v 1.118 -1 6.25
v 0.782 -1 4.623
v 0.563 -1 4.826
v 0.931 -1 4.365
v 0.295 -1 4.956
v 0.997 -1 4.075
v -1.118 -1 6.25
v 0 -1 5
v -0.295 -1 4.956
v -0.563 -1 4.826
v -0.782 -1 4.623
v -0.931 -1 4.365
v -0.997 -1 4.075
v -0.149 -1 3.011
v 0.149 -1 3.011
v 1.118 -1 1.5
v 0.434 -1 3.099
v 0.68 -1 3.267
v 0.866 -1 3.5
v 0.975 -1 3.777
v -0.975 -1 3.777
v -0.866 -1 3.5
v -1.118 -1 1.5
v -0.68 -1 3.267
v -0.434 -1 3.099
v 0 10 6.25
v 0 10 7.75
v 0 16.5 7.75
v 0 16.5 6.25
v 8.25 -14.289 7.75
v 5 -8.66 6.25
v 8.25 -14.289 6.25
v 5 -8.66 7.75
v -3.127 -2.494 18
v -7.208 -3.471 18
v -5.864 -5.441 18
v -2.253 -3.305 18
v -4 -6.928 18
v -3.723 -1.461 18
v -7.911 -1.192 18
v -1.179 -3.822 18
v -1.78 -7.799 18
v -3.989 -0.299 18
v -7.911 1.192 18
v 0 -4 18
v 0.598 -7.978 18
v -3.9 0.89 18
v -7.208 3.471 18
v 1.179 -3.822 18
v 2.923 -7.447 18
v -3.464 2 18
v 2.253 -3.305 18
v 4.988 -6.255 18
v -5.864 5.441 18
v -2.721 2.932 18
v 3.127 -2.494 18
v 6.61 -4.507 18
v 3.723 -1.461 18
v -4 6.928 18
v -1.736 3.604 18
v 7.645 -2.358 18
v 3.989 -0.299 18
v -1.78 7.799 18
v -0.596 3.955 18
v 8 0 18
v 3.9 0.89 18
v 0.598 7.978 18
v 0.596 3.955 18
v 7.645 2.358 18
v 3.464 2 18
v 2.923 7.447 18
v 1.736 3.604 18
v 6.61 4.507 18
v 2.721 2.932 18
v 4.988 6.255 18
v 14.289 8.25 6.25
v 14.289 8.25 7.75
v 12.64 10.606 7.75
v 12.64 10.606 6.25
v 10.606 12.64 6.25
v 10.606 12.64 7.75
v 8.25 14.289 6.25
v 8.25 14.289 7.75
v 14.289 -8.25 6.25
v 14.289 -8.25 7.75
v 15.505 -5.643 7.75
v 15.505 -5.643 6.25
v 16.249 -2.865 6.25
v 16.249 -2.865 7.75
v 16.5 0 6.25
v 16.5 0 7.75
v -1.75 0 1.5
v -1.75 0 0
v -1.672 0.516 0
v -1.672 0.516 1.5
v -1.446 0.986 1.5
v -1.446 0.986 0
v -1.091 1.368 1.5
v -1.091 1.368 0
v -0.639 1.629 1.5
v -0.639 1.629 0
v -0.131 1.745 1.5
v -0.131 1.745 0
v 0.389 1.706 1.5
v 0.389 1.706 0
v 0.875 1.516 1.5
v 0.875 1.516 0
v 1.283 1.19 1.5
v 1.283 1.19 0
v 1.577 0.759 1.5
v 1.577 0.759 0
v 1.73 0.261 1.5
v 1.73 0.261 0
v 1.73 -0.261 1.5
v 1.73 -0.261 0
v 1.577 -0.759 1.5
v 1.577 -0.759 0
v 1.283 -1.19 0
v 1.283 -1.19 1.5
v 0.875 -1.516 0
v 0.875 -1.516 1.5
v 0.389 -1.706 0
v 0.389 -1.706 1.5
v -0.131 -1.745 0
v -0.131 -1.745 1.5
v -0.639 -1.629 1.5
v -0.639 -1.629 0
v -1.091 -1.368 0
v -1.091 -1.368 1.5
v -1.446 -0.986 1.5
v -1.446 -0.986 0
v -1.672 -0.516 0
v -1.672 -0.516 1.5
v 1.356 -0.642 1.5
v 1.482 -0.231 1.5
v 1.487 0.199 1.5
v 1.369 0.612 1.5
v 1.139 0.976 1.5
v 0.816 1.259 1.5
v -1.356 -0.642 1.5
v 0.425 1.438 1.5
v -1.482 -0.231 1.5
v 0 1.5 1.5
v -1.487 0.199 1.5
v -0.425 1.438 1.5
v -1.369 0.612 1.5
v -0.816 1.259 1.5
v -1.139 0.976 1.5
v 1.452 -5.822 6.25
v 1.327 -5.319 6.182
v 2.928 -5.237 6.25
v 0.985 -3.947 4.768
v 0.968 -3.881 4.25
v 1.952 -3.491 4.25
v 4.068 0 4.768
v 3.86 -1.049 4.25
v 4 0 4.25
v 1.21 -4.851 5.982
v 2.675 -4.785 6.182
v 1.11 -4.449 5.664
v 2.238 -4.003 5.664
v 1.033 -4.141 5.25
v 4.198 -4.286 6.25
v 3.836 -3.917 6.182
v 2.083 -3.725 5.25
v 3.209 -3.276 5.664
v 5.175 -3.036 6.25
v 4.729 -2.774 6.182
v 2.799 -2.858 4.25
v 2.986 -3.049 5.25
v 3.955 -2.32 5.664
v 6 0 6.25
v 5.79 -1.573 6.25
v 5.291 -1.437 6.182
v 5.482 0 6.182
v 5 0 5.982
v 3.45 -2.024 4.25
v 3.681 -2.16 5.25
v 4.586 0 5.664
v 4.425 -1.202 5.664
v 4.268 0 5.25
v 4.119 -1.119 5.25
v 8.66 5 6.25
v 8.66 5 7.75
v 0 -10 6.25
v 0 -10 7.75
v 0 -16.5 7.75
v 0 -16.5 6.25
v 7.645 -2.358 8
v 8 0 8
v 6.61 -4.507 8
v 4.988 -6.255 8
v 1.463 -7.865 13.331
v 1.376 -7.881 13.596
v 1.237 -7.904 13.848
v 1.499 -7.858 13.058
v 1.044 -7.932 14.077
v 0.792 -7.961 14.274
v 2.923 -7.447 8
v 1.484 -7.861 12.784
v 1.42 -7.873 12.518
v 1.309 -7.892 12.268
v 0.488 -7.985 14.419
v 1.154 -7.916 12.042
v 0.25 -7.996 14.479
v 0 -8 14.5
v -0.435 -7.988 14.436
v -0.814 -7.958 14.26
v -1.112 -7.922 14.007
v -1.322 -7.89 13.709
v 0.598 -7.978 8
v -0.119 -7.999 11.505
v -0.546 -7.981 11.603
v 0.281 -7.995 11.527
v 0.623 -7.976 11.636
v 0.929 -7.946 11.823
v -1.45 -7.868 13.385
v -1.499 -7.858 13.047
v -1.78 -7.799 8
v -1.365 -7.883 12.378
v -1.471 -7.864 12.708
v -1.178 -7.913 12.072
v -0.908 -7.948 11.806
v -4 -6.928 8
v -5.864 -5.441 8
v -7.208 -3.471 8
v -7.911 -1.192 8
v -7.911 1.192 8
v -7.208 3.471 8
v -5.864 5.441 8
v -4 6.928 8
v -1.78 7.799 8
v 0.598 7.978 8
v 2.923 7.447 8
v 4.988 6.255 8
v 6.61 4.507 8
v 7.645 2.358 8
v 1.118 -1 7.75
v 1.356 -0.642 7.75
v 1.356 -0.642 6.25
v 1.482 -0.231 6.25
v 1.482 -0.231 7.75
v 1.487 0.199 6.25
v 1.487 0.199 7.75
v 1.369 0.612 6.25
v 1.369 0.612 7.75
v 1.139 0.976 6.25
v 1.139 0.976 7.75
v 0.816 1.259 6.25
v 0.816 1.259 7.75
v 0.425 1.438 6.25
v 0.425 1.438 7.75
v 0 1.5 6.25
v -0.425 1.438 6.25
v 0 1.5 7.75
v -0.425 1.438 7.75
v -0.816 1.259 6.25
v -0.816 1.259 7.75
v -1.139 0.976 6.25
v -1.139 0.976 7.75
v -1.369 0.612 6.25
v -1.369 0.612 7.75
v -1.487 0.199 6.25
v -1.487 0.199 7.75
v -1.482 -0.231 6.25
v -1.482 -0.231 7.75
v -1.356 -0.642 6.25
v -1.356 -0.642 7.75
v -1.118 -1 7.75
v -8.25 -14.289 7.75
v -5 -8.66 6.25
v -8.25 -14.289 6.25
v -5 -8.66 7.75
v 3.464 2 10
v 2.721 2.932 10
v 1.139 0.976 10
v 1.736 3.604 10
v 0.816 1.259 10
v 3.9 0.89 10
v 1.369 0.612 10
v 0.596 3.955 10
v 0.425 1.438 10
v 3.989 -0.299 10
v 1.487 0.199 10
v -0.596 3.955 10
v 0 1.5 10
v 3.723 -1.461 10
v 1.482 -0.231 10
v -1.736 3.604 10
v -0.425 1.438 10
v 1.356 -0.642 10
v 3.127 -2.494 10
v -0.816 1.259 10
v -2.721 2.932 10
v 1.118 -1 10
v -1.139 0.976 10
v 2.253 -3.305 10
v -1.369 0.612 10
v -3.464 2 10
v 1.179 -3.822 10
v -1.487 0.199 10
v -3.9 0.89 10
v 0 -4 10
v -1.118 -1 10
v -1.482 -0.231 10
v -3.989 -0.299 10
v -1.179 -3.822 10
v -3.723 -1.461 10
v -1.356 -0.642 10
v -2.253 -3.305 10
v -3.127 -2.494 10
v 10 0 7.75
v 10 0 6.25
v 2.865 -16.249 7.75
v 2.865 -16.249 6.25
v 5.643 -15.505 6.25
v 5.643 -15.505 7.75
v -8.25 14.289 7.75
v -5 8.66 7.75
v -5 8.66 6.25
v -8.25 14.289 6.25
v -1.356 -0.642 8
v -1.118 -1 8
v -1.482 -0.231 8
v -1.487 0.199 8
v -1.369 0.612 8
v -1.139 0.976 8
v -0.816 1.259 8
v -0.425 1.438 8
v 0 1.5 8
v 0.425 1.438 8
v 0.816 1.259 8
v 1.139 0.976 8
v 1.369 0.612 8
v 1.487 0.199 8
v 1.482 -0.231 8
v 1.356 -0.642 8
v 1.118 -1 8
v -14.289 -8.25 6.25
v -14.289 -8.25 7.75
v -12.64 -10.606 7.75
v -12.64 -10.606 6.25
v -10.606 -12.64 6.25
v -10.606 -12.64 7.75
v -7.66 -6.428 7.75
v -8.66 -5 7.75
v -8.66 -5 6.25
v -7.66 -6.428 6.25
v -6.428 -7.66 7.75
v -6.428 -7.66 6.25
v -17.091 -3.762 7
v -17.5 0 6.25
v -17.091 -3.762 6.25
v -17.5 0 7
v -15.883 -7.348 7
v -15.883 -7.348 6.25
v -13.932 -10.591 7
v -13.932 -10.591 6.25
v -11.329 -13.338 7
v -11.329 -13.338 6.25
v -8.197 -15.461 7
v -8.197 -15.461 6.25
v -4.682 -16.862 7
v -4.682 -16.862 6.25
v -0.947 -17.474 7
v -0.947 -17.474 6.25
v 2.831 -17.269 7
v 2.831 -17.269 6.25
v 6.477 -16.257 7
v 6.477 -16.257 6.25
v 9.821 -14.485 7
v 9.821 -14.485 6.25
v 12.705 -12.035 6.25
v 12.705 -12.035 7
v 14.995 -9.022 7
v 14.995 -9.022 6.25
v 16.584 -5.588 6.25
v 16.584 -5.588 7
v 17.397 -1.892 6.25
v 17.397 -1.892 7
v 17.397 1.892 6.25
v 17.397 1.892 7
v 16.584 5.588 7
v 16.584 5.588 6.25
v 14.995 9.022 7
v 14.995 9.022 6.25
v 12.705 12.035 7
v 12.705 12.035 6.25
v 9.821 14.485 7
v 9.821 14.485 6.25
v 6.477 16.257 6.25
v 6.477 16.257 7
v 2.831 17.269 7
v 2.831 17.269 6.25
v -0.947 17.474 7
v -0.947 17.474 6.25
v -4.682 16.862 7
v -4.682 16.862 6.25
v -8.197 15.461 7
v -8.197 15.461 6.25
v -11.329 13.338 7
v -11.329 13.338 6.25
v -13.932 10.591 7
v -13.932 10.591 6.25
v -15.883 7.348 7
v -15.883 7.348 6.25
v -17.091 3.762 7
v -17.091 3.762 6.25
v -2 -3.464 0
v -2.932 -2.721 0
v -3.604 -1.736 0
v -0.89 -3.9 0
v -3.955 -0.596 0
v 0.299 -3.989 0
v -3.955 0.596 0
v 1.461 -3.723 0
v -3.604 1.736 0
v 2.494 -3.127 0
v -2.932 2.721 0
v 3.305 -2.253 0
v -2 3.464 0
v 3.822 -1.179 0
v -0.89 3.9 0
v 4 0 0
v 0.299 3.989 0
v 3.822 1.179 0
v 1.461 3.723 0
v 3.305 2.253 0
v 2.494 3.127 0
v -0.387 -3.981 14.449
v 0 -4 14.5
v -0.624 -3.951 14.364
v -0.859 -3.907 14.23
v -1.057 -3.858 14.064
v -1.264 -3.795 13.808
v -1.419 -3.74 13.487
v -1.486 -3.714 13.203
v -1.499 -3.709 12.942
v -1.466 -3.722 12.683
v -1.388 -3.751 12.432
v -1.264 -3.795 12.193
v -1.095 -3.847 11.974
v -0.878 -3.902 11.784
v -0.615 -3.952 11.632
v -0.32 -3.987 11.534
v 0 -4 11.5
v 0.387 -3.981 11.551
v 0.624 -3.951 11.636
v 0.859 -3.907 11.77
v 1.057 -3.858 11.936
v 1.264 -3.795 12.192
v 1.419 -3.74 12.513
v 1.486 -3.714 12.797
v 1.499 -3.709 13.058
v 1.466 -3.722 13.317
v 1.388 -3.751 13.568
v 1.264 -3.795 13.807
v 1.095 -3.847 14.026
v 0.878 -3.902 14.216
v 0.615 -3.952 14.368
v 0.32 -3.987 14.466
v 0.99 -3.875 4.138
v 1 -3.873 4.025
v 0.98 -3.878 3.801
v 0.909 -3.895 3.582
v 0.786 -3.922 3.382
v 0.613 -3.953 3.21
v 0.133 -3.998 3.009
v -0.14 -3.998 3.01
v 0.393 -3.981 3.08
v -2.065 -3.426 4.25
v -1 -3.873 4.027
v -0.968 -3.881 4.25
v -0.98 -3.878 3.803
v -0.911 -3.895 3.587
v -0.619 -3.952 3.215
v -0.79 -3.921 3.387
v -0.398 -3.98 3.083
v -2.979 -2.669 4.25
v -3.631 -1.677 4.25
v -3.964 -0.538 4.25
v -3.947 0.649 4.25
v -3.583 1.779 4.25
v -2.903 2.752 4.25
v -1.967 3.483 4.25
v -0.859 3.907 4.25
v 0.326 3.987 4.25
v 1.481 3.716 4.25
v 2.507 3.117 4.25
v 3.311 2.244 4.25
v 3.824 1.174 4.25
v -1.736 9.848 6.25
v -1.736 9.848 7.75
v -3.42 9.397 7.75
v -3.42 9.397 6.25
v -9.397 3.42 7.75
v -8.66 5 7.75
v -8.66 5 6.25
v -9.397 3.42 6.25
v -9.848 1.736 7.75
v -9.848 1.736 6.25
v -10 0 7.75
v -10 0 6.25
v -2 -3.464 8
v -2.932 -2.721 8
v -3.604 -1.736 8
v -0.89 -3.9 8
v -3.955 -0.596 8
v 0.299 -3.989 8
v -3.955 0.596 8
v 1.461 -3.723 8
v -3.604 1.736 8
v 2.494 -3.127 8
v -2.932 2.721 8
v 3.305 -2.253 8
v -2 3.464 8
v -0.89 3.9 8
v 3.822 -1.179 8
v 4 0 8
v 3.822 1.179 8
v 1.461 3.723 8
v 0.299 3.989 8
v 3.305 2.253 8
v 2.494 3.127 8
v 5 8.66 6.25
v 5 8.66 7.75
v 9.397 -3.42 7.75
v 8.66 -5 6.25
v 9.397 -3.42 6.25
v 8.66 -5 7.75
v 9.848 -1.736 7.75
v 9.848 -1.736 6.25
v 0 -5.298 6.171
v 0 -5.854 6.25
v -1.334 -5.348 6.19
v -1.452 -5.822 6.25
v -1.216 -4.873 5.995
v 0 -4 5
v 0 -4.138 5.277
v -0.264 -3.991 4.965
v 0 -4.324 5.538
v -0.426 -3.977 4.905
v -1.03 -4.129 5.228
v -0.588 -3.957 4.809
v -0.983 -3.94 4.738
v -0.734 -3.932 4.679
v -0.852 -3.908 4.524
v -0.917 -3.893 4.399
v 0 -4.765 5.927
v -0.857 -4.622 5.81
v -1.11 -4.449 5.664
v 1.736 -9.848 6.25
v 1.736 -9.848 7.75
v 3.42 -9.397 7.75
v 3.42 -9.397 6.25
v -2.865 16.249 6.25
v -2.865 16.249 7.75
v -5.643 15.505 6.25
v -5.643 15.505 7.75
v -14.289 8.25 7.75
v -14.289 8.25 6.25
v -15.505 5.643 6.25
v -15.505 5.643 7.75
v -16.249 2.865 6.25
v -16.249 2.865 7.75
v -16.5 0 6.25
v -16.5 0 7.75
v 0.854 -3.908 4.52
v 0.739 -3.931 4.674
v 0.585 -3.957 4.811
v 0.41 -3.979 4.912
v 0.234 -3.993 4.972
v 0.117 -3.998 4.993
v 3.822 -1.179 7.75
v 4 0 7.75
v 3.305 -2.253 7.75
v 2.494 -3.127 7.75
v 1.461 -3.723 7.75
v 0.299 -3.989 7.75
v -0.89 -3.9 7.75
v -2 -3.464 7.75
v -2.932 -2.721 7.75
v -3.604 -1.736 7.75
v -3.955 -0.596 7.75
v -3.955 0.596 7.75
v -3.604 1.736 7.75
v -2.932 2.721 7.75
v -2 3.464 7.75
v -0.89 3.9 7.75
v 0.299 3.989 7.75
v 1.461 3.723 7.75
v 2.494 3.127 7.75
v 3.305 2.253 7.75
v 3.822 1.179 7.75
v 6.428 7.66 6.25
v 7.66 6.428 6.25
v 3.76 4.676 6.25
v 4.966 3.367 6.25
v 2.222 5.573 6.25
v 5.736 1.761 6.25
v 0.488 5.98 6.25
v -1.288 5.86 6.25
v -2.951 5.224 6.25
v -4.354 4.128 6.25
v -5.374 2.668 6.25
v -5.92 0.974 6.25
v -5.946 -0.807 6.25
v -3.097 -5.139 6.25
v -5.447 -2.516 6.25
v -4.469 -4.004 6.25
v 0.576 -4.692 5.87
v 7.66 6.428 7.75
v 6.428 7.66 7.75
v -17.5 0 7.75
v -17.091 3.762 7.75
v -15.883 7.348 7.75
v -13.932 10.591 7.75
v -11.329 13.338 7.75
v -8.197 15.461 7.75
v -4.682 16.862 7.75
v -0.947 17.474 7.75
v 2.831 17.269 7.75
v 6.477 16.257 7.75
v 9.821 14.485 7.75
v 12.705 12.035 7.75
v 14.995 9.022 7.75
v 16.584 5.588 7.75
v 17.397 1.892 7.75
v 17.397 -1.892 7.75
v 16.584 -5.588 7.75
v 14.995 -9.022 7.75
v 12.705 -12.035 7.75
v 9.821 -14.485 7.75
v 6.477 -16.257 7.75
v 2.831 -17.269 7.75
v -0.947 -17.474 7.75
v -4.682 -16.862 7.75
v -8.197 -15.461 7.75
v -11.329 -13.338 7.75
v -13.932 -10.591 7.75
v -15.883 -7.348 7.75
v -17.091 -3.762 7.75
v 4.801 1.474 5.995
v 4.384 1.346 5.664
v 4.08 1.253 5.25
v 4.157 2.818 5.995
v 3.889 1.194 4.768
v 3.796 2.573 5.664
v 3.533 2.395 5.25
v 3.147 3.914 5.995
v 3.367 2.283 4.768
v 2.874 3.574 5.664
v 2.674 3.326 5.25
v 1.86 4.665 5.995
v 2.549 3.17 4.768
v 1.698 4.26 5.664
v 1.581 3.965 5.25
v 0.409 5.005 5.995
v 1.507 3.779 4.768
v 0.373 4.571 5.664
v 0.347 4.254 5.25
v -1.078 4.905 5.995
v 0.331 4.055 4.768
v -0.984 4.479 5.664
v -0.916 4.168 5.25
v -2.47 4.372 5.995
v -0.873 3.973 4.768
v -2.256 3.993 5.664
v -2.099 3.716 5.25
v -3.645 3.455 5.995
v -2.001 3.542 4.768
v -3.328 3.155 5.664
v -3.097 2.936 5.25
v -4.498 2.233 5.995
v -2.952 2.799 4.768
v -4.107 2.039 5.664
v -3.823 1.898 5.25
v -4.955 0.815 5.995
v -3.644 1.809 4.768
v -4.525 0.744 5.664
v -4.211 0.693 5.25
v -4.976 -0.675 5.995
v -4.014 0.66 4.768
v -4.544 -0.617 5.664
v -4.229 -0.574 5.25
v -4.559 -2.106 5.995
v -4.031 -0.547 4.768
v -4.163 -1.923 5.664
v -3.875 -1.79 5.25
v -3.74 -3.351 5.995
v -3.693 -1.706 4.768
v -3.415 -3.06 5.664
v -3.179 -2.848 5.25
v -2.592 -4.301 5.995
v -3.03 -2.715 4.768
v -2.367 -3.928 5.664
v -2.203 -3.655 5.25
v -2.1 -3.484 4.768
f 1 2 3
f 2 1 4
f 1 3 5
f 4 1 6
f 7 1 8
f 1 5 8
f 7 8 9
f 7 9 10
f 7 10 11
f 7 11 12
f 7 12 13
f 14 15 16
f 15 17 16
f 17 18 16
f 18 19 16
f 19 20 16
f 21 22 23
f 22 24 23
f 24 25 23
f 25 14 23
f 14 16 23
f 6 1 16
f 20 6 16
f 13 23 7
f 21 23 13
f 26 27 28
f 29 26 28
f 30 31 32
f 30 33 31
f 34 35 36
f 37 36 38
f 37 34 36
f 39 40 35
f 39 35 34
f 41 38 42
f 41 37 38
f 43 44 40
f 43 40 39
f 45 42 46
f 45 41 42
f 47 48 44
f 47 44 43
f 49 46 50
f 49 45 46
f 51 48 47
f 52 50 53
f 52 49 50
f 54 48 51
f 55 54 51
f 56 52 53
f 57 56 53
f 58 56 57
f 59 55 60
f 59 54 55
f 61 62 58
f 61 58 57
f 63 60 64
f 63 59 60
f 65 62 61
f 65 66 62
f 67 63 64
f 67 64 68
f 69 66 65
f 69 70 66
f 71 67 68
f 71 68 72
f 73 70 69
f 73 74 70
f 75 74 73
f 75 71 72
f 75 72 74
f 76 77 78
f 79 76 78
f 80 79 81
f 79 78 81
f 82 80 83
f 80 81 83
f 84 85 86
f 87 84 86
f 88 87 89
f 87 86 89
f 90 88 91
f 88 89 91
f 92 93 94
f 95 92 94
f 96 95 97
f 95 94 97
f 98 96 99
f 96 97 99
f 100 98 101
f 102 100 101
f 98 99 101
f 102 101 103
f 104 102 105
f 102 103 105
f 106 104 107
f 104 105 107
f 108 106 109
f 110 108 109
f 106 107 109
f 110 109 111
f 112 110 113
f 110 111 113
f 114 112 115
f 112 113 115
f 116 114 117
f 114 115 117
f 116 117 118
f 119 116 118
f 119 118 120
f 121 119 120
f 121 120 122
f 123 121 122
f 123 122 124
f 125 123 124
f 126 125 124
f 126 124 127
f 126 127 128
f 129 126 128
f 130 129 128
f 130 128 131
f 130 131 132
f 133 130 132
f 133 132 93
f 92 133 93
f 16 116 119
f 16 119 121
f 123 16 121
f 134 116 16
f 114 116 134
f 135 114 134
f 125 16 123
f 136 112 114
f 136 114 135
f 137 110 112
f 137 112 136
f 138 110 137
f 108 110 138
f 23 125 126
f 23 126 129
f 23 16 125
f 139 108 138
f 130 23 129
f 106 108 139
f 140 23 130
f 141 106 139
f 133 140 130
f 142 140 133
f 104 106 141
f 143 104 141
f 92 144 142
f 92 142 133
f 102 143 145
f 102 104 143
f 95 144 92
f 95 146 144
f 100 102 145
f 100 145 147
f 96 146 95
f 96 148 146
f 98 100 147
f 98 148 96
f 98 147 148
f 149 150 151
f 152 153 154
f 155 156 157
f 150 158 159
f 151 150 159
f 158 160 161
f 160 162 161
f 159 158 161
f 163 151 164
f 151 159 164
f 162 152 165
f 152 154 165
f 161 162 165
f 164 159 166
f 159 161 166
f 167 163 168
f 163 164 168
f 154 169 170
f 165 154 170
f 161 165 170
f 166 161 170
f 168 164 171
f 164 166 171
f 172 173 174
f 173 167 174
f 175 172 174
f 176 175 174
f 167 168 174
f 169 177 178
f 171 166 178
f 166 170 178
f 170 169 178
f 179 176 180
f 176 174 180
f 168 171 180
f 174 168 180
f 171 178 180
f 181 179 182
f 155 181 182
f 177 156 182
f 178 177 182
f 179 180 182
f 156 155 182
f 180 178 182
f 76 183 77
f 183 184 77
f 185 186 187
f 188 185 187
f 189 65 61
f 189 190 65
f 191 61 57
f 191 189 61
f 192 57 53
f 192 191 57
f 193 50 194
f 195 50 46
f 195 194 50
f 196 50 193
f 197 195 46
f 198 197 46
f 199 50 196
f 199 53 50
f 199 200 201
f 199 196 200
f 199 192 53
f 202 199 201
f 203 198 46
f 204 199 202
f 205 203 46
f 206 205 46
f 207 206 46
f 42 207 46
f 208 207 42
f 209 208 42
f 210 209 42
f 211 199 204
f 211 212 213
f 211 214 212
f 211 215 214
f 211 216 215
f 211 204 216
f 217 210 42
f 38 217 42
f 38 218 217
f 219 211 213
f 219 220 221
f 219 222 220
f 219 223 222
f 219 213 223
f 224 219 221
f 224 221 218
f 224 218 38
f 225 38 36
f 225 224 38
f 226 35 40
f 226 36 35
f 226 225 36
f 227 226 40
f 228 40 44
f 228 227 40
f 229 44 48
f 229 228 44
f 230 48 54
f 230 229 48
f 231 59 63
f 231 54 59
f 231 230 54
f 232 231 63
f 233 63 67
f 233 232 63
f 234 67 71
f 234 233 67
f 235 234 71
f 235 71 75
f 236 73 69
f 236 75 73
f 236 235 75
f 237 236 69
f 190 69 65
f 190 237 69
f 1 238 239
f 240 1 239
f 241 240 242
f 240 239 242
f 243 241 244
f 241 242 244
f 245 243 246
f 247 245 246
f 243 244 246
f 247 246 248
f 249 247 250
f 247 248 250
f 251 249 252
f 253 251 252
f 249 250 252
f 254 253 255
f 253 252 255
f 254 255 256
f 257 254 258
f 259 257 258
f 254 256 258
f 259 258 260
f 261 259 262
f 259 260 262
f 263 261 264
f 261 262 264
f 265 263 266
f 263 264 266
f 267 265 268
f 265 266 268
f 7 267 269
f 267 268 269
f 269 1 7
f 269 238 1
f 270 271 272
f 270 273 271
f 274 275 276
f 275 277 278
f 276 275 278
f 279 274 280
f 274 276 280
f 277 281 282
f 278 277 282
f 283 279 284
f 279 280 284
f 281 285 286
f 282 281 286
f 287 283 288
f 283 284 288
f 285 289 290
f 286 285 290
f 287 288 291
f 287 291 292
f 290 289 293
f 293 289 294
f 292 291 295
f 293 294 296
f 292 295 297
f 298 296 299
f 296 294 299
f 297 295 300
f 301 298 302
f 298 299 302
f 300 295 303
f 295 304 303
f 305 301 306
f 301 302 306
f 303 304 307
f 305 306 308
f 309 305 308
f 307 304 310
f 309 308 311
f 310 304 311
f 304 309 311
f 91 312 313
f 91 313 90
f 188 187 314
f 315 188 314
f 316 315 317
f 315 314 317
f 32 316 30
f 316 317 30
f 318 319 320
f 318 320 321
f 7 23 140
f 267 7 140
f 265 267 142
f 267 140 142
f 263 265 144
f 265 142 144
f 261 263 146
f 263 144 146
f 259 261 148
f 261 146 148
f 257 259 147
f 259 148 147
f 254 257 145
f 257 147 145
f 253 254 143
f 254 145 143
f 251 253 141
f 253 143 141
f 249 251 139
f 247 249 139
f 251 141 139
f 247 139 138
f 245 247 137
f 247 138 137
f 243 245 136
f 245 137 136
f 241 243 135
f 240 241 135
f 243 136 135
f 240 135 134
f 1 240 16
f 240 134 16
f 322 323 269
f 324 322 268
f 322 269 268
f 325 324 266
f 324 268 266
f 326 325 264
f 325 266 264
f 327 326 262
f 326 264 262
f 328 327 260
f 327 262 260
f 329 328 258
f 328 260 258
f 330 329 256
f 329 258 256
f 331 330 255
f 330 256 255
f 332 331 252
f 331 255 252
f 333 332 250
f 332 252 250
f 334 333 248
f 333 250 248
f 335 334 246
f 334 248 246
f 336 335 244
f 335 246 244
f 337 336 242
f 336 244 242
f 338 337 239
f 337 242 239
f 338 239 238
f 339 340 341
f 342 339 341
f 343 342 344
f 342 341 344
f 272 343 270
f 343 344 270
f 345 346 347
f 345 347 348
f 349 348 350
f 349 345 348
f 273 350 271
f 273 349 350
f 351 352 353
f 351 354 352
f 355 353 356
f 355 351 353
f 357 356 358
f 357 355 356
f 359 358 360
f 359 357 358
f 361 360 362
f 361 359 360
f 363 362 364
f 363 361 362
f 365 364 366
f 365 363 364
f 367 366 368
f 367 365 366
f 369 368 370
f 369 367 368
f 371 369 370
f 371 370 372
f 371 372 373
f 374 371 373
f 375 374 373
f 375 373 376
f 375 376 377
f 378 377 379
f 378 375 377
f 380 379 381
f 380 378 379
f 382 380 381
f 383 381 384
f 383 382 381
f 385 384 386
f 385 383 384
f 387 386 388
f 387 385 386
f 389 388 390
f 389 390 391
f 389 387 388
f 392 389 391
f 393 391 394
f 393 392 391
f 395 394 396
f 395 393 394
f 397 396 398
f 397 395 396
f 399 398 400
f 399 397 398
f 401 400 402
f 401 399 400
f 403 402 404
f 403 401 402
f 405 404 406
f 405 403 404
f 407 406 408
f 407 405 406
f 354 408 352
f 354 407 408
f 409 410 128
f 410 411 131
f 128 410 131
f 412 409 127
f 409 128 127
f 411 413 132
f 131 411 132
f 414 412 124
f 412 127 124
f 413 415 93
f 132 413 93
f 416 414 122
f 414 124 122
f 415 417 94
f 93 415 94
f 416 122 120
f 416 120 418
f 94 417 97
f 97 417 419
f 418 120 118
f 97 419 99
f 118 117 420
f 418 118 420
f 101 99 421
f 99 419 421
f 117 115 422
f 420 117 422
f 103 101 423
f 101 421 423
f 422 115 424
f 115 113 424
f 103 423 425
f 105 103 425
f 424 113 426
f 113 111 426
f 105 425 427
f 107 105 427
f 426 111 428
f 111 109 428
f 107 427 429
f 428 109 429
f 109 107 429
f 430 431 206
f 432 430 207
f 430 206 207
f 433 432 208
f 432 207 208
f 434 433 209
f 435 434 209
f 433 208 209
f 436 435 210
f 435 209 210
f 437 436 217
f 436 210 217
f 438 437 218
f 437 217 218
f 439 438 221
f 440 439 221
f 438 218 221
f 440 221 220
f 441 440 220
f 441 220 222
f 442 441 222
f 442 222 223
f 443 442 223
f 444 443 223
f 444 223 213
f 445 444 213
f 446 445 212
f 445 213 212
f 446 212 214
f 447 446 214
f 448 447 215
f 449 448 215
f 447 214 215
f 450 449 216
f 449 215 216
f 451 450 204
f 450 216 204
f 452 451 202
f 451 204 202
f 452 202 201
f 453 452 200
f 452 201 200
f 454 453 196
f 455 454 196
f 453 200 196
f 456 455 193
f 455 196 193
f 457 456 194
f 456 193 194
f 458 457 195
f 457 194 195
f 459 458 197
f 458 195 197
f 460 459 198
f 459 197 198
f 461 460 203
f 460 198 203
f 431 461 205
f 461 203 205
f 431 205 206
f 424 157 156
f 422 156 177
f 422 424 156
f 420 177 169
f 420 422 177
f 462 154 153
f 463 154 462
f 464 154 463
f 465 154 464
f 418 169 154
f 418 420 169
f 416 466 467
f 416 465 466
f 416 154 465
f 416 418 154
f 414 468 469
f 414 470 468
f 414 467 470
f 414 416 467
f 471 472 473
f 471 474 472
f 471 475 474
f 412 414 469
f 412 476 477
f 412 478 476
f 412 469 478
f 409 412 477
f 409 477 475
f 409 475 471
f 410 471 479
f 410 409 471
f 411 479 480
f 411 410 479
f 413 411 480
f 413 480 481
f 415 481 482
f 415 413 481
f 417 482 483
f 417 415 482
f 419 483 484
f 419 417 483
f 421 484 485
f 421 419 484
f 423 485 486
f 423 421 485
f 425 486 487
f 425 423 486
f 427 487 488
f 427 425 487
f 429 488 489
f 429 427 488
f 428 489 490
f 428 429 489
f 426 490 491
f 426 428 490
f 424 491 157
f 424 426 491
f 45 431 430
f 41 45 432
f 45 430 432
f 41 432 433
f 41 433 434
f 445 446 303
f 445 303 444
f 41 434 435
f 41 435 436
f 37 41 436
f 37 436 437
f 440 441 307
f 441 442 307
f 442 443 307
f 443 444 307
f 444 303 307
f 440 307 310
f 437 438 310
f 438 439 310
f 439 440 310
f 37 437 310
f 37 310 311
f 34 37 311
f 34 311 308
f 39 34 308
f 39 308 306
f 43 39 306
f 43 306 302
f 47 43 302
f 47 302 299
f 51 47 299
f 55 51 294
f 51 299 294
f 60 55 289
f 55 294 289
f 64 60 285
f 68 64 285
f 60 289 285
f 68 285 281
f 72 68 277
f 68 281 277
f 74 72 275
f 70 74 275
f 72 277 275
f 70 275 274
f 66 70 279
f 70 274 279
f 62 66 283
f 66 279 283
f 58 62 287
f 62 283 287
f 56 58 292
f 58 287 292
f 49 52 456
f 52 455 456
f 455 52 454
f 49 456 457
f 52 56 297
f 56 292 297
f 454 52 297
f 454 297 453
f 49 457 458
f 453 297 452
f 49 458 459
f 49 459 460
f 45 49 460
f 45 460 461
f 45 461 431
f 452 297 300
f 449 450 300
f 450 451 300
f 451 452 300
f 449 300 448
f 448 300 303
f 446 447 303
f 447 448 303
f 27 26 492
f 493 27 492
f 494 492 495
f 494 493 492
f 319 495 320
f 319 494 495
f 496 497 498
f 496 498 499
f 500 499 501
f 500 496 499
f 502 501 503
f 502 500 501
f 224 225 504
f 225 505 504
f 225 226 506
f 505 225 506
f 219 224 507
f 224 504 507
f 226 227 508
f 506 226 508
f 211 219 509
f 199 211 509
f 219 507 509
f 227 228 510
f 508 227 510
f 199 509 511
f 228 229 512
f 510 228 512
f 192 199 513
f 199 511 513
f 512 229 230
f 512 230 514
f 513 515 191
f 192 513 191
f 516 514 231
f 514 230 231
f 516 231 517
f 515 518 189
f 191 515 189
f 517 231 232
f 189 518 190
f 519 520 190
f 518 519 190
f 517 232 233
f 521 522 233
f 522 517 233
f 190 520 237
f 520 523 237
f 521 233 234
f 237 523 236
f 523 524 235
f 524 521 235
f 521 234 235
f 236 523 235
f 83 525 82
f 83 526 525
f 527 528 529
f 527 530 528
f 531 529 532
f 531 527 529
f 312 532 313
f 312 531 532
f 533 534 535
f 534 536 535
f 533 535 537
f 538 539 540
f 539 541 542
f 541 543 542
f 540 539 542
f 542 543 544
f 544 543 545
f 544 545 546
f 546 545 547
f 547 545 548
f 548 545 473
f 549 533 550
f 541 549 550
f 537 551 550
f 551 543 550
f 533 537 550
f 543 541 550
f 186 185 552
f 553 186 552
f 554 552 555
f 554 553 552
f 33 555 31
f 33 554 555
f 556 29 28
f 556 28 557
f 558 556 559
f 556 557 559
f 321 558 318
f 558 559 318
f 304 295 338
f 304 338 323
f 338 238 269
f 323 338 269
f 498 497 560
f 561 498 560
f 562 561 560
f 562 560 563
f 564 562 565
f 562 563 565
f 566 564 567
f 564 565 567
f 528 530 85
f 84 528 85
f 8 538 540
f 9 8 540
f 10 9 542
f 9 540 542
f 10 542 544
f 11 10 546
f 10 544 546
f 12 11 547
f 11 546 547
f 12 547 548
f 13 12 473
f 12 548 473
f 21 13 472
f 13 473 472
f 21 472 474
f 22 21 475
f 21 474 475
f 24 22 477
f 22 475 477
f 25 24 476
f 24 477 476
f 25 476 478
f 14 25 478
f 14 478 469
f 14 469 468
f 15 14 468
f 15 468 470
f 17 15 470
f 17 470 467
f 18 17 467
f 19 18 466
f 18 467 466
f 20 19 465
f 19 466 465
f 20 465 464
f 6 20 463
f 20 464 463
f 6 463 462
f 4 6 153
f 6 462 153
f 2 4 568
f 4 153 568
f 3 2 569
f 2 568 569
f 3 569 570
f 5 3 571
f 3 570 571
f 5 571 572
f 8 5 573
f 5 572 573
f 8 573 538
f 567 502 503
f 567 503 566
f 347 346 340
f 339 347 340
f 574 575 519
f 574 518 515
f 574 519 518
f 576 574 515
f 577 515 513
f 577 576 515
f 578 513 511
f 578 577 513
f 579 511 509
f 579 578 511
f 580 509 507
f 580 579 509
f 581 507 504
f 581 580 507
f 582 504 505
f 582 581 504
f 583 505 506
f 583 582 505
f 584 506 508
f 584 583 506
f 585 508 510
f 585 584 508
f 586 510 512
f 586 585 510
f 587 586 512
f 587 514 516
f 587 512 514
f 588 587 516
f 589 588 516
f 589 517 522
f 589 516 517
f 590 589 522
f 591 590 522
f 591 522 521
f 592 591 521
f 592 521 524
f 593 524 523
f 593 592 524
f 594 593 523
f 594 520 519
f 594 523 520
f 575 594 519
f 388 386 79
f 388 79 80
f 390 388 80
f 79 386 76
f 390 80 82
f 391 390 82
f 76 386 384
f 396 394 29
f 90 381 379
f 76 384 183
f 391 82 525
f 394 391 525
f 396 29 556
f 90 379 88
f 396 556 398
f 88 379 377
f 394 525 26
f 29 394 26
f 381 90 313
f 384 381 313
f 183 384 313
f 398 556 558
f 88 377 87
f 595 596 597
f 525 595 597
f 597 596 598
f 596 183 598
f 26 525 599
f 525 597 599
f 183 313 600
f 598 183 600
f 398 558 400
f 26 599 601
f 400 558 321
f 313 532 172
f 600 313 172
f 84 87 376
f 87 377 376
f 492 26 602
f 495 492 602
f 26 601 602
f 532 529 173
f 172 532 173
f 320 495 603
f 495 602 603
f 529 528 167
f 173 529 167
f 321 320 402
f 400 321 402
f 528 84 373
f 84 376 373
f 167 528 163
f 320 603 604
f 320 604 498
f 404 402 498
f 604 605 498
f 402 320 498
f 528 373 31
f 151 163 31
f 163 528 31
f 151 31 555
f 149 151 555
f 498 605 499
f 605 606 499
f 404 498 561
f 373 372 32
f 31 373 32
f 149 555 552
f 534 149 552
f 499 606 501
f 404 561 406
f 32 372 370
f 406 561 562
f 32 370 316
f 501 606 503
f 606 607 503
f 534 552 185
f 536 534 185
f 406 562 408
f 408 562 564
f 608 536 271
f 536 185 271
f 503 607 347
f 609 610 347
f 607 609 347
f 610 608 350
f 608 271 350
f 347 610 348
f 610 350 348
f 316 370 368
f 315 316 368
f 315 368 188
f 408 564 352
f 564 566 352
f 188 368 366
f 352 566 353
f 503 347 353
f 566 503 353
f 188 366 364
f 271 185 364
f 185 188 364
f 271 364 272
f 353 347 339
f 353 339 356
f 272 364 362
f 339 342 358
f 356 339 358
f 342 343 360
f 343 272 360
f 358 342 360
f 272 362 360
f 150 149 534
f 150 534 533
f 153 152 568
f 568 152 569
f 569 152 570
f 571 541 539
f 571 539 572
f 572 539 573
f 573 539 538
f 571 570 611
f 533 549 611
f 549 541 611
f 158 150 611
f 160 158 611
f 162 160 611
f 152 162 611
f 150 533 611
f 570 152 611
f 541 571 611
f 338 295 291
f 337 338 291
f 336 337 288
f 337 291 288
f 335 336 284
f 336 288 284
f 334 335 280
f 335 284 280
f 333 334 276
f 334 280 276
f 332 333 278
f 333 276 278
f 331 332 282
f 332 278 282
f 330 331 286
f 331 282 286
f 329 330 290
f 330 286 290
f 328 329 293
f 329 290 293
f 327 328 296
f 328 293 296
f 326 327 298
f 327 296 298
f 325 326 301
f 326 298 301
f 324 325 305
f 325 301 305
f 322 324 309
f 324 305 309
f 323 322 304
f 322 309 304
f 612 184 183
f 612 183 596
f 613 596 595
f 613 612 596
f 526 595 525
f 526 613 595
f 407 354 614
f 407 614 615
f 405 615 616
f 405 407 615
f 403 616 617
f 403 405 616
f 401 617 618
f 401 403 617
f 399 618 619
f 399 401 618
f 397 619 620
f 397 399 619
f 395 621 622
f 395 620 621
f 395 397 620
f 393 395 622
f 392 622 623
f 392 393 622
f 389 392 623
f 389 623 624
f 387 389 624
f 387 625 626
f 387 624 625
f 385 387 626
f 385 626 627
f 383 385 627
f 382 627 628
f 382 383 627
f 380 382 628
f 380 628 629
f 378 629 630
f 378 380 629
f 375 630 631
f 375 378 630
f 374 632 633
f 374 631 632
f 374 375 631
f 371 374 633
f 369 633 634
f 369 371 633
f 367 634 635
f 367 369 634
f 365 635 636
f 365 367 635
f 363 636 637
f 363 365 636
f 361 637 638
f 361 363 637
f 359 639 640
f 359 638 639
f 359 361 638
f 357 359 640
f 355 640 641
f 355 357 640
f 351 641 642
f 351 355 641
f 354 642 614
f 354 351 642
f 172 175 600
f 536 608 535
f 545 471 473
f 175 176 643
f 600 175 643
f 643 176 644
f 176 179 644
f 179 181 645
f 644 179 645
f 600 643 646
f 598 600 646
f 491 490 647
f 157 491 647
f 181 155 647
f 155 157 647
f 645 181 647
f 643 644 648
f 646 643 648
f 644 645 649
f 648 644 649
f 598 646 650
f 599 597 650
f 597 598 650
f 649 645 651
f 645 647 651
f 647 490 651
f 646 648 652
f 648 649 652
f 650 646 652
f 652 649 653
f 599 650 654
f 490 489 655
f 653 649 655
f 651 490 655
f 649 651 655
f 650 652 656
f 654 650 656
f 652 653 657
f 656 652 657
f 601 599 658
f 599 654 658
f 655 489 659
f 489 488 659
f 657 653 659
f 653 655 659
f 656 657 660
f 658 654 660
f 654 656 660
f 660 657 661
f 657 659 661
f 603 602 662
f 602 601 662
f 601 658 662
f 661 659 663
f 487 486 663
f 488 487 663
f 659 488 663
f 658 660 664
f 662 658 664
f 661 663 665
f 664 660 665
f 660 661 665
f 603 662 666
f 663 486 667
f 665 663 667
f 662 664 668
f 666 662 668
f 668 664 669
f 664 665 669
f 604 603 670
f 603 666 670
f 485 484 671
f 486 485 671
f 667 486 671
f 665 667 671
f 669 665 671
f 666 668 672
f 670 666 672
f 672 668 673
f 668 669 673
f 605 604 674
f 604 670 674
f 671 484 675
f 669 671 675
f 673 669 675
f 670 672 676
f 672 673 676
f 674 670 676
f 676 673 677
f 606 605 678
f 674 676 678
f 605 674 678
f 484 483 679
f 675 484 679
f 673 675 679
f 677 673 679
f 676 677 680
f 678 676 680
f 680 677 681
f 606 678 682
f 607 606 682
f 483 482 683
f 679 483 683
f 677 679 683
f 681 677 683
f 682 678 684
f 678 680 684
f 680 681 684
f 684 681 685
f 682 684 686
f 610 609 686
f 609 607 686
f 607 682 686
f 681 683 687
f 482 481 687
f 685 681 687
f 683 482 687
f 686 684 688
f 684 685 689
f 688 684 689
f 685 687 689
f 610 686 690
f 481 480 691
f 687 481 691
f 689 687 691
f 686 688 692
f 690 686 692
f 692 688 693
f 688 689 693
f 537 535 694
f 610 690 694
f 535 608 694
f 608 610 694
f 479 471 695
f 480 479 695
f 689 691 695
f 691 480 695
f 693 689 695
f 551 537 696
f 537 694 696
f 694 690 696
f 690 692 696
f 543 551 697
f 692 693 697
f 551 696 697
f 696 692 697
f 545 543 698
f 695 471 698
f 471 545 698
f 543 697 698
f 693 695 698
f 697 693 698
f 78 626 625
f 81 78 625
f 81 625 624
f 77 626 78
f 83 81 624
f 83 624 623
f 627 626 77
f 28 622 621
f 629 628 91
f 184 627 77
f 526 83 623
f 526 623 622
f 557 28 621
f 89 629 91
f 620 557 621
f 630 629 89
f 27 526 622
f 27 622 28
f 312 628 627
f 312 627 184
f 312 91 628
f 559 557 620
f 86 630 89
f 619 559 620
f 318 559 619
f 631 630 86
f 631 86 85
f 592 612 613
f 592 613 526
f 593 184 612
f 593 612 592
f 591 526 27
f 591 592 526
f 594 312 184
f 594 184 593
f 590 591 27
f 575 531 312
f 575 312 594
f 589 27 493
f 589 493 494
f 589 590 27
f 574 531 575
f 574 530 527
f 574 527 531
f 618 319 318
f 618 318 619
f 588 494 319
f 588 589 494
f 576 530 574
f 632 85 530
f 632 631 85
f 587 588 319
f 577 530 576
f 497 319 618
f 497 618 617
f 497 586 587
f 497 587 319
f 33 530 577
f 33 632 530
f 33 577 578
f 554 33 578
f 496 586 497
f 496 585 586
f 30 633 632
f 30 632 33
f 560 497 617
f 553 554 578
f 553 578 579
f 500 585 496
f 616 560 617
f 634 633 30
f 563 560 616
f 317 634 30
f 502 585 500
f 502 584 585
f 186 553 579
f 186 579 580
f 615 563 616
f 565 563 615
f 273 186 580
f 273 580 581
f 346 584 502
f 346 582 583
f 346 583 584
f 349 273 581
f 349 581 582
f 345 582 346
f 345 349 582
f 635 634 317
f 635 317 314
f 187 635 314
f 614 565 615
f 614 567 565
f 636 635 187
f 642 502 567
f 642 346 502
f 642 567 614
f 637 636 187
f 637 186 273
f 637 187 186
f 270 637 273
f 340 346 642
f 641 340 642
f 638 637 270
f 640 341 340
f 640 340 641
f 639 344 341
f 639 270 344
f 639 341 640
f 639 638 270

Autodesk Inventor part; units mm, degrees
ref_plane "YZ Plane" through (0, 0, 0) normal (1, 0, 0) x (0, 1, 0)
ref_plane "XZ Plane" through (0, 0, 0) normal (0, 1, 0) x (-1, 0, 0)
ref_plane "XY Plane" through (0, 0, 0) normal (0, 0, 1) x (1, 0, 0)
sketch "Boceto1" plane through (0, 0, 0) normal (0, 0, 1) x (1, 0, 0)
  circle A0 centre (0, 0) radius 4
  circle A1 centre (0, 0) radius 1.5 projected
  line L0 (0, -1) -> (1.5, -1)
  line L1 (1.5, -1) -> (-2.7531, -1)
  point P0 (1, -1.118)
  point P1 (1, 1.118)
  point P2 (-1.118, -1)
  point P3 (1.118, -1)
  dimension "d0" = 8
extrude "Extrusión1" add sketch "Boceto1" along normal blind 8 contours A0 | L1 L0 A1 picked at (-0.6553, -1.0791)
sketch "Boceto2" plane through (0, 0, 8) normal (0, 0, 1) x (1, 0, 0)
  circle A0 centre (0, 0) radius 8
  dimension "d3" = 16
extrude "Extrusión2" add sketch "Boceto2" along normal blind 10
sketch "Boceto3" plane through (0, 0, 18) normal (0, 0, 1) x (1, 0, 0)
  circle A0 centre (0, 0) radius 8 projected
hole "Agujero1" at (0, 0, 18) direction (0, 0, -1) diameter 8 depth 8
sketch "Boceto5" plane through (0, 0, 0) normal (0, 1, 0) x (-1, 0, 0)
  line L0 (0, 0) -> (0, 4)
  circle A0 centre (0, 4) radius 1
  line L1 (0, 4) -> (0, 8)
  line L2 (0, 8) -> (0, 13)
  circle A1 centre (0, 13) radius 1.5
  dimension "d20" = 4
  dimension "d21" = 2
  dimension "d29" = 5
  dimension "d30" = 3
hole "Agujero3" at (0, 0, 4) direction (0, -1, 0) diameter 2 end through all
sketch "Boceto6" plane through (0, 0, 0) normal (0, 1, 0) x (-1, 0, 0)
  line L0 (0, 0) -> (0, 13)
  circle A0 centre (0, 13) radius 1.5
  dimension "d31" = 13
  dimension "d32" = 3
hole "Agujero4" at (0, 0, 13) direction (0, -1, 0) diameter 3 end through all
ref_plane "Plano de trabajo2" through (0, 0, 7) normal (0, 0, 1) x (-1, 0, 0)
sketch "Boceto7" plane through (0, 0, 7) normal (0, 0, 1) x (-1, 0, 0)
  circle A0 centre (0, 0) radius 17.5
  dimension "d42" = 35
extrude "Extrusión3" add sketch "Boceto7" along normal mid plane 1.5
sketch "Boceto8" plane through (0, 0, 7.75) normal (0, 0, 1) x (1, 0, 0)
  circle A0 centre (0, 0) radius 8 projected
  circle A1 centre (0, 0) radius 17.5 projected
  arc A2 (8.6603, -5) -> (10, 0) centre (0, 0) ccw
  arc A3 (14.2894, -8.25) -> (16.5, 0) centre (0, 0) ccw
  line L0 (10, 0) -> (16.5, 0)
  line L1 (0, 0) -> (16.5, 0) construction
  line L2 (8.6603, -5) -> (14.2894, -8.25)
  arc A4 (8.6603, 5) -> (5, 8.6603) centre (0, 0) ccw
  line L3 (8.6603, 5) -> (14.2894, 8.25)
  arc A5 (14.2894, 8.25) -> (8.25, 14.2894) centre (0, 0) ccw
  line L4 (5, 8.6603) -> (8.25, 14.2894)
  arc A6 (0, 10) -> (-5, 8.6603) centre (0, 0) ccw
  line L5 (0, 10) -> (0, 16.5)
  arc A7 (0, 16.5) -> (-8.25, 14.2894) centre (0, 0) ccw
  line L6 (-5, 8.6603) -> (-8.25, 14.2894)
  arc A8 (-8.6603, 5) -> (-10, 0) centre (0, 0) ccw
  line L7 (-8.6603, 5) -> (-14.2894, 8.25)
  arc A9 (-14.2894, 8.25) -> (-16.5, 0) centre (0, 0) ccw
  line L8 (-10, 0) -> (-16.5, 0)
  arc A10 (-8.6603, -5) -> (-5, -8.6603) centre (0, 0) ccw
  line L9 (-8.6603, -5) -> (-14.2894, -8.25)
  arc A11 (-14.2894, -8.25) -> (-8.25, -14.2894) centre (0, 0) ccw
  line L10 (-5, -8.6603) -> (-8.25, -14.2894)
  arc A12 (0, -10) -> (5, -8.6603) centre (0, 0) ccw
  line L11 (0, -10) -> (0, -16.5)
  arc A13 (0, -16.5) -> (8.25, -14.2894) centre (0, 0) ccw
  line L12 (5, -8.6603) -> (8.25, -14.2894)
  point P0 (0, 0)
  dimension "d45" = 2
  dimension "d46" = 1
  dimension "d50" = 360
extrude "Extrusión4" cut sketch "Boceto8" against normal through all contours A2 L0 A3 L2 | A4 L4 A5 L3 | A6 L6 A7 L5 | A8 L8 A9 L7 | A10 L10 A11 L9 | A12 L12 A13 L11
sketch "Boceto9" plane through (0, 0, 0) normal (0, 0, -1) x (-1, 0, 0)
  circle A0 centre (0, 0) radius 1.75
  dimension "d54" = 3.5
extrude "Extrusión5" cut sketch "Boceto9" against normal blind 1.5
sketch "Boceto10" plane through (0, 0, 10) normal (0, 0, 1) x (1, 0, 0)
  arc A0 (1.118, -1) -> (-1.118, -1) centre (0, 0) ccw projected
  circle A1 centre (0, 0) radius 1.75 projected
  line L0 (1.118, -1) -> (-1.118, -1) projected
  point P0 (-1.4361, -1)
  point P1 (-1.7451, -0.1303)
extrude "Extrusión6" cut sketch "Boceto10" against normal blind 10 contours L0 A0
fillet "Empalme3" radius 2 1 edges at (-4, 0, 6.25)
properties part number "Acople"
